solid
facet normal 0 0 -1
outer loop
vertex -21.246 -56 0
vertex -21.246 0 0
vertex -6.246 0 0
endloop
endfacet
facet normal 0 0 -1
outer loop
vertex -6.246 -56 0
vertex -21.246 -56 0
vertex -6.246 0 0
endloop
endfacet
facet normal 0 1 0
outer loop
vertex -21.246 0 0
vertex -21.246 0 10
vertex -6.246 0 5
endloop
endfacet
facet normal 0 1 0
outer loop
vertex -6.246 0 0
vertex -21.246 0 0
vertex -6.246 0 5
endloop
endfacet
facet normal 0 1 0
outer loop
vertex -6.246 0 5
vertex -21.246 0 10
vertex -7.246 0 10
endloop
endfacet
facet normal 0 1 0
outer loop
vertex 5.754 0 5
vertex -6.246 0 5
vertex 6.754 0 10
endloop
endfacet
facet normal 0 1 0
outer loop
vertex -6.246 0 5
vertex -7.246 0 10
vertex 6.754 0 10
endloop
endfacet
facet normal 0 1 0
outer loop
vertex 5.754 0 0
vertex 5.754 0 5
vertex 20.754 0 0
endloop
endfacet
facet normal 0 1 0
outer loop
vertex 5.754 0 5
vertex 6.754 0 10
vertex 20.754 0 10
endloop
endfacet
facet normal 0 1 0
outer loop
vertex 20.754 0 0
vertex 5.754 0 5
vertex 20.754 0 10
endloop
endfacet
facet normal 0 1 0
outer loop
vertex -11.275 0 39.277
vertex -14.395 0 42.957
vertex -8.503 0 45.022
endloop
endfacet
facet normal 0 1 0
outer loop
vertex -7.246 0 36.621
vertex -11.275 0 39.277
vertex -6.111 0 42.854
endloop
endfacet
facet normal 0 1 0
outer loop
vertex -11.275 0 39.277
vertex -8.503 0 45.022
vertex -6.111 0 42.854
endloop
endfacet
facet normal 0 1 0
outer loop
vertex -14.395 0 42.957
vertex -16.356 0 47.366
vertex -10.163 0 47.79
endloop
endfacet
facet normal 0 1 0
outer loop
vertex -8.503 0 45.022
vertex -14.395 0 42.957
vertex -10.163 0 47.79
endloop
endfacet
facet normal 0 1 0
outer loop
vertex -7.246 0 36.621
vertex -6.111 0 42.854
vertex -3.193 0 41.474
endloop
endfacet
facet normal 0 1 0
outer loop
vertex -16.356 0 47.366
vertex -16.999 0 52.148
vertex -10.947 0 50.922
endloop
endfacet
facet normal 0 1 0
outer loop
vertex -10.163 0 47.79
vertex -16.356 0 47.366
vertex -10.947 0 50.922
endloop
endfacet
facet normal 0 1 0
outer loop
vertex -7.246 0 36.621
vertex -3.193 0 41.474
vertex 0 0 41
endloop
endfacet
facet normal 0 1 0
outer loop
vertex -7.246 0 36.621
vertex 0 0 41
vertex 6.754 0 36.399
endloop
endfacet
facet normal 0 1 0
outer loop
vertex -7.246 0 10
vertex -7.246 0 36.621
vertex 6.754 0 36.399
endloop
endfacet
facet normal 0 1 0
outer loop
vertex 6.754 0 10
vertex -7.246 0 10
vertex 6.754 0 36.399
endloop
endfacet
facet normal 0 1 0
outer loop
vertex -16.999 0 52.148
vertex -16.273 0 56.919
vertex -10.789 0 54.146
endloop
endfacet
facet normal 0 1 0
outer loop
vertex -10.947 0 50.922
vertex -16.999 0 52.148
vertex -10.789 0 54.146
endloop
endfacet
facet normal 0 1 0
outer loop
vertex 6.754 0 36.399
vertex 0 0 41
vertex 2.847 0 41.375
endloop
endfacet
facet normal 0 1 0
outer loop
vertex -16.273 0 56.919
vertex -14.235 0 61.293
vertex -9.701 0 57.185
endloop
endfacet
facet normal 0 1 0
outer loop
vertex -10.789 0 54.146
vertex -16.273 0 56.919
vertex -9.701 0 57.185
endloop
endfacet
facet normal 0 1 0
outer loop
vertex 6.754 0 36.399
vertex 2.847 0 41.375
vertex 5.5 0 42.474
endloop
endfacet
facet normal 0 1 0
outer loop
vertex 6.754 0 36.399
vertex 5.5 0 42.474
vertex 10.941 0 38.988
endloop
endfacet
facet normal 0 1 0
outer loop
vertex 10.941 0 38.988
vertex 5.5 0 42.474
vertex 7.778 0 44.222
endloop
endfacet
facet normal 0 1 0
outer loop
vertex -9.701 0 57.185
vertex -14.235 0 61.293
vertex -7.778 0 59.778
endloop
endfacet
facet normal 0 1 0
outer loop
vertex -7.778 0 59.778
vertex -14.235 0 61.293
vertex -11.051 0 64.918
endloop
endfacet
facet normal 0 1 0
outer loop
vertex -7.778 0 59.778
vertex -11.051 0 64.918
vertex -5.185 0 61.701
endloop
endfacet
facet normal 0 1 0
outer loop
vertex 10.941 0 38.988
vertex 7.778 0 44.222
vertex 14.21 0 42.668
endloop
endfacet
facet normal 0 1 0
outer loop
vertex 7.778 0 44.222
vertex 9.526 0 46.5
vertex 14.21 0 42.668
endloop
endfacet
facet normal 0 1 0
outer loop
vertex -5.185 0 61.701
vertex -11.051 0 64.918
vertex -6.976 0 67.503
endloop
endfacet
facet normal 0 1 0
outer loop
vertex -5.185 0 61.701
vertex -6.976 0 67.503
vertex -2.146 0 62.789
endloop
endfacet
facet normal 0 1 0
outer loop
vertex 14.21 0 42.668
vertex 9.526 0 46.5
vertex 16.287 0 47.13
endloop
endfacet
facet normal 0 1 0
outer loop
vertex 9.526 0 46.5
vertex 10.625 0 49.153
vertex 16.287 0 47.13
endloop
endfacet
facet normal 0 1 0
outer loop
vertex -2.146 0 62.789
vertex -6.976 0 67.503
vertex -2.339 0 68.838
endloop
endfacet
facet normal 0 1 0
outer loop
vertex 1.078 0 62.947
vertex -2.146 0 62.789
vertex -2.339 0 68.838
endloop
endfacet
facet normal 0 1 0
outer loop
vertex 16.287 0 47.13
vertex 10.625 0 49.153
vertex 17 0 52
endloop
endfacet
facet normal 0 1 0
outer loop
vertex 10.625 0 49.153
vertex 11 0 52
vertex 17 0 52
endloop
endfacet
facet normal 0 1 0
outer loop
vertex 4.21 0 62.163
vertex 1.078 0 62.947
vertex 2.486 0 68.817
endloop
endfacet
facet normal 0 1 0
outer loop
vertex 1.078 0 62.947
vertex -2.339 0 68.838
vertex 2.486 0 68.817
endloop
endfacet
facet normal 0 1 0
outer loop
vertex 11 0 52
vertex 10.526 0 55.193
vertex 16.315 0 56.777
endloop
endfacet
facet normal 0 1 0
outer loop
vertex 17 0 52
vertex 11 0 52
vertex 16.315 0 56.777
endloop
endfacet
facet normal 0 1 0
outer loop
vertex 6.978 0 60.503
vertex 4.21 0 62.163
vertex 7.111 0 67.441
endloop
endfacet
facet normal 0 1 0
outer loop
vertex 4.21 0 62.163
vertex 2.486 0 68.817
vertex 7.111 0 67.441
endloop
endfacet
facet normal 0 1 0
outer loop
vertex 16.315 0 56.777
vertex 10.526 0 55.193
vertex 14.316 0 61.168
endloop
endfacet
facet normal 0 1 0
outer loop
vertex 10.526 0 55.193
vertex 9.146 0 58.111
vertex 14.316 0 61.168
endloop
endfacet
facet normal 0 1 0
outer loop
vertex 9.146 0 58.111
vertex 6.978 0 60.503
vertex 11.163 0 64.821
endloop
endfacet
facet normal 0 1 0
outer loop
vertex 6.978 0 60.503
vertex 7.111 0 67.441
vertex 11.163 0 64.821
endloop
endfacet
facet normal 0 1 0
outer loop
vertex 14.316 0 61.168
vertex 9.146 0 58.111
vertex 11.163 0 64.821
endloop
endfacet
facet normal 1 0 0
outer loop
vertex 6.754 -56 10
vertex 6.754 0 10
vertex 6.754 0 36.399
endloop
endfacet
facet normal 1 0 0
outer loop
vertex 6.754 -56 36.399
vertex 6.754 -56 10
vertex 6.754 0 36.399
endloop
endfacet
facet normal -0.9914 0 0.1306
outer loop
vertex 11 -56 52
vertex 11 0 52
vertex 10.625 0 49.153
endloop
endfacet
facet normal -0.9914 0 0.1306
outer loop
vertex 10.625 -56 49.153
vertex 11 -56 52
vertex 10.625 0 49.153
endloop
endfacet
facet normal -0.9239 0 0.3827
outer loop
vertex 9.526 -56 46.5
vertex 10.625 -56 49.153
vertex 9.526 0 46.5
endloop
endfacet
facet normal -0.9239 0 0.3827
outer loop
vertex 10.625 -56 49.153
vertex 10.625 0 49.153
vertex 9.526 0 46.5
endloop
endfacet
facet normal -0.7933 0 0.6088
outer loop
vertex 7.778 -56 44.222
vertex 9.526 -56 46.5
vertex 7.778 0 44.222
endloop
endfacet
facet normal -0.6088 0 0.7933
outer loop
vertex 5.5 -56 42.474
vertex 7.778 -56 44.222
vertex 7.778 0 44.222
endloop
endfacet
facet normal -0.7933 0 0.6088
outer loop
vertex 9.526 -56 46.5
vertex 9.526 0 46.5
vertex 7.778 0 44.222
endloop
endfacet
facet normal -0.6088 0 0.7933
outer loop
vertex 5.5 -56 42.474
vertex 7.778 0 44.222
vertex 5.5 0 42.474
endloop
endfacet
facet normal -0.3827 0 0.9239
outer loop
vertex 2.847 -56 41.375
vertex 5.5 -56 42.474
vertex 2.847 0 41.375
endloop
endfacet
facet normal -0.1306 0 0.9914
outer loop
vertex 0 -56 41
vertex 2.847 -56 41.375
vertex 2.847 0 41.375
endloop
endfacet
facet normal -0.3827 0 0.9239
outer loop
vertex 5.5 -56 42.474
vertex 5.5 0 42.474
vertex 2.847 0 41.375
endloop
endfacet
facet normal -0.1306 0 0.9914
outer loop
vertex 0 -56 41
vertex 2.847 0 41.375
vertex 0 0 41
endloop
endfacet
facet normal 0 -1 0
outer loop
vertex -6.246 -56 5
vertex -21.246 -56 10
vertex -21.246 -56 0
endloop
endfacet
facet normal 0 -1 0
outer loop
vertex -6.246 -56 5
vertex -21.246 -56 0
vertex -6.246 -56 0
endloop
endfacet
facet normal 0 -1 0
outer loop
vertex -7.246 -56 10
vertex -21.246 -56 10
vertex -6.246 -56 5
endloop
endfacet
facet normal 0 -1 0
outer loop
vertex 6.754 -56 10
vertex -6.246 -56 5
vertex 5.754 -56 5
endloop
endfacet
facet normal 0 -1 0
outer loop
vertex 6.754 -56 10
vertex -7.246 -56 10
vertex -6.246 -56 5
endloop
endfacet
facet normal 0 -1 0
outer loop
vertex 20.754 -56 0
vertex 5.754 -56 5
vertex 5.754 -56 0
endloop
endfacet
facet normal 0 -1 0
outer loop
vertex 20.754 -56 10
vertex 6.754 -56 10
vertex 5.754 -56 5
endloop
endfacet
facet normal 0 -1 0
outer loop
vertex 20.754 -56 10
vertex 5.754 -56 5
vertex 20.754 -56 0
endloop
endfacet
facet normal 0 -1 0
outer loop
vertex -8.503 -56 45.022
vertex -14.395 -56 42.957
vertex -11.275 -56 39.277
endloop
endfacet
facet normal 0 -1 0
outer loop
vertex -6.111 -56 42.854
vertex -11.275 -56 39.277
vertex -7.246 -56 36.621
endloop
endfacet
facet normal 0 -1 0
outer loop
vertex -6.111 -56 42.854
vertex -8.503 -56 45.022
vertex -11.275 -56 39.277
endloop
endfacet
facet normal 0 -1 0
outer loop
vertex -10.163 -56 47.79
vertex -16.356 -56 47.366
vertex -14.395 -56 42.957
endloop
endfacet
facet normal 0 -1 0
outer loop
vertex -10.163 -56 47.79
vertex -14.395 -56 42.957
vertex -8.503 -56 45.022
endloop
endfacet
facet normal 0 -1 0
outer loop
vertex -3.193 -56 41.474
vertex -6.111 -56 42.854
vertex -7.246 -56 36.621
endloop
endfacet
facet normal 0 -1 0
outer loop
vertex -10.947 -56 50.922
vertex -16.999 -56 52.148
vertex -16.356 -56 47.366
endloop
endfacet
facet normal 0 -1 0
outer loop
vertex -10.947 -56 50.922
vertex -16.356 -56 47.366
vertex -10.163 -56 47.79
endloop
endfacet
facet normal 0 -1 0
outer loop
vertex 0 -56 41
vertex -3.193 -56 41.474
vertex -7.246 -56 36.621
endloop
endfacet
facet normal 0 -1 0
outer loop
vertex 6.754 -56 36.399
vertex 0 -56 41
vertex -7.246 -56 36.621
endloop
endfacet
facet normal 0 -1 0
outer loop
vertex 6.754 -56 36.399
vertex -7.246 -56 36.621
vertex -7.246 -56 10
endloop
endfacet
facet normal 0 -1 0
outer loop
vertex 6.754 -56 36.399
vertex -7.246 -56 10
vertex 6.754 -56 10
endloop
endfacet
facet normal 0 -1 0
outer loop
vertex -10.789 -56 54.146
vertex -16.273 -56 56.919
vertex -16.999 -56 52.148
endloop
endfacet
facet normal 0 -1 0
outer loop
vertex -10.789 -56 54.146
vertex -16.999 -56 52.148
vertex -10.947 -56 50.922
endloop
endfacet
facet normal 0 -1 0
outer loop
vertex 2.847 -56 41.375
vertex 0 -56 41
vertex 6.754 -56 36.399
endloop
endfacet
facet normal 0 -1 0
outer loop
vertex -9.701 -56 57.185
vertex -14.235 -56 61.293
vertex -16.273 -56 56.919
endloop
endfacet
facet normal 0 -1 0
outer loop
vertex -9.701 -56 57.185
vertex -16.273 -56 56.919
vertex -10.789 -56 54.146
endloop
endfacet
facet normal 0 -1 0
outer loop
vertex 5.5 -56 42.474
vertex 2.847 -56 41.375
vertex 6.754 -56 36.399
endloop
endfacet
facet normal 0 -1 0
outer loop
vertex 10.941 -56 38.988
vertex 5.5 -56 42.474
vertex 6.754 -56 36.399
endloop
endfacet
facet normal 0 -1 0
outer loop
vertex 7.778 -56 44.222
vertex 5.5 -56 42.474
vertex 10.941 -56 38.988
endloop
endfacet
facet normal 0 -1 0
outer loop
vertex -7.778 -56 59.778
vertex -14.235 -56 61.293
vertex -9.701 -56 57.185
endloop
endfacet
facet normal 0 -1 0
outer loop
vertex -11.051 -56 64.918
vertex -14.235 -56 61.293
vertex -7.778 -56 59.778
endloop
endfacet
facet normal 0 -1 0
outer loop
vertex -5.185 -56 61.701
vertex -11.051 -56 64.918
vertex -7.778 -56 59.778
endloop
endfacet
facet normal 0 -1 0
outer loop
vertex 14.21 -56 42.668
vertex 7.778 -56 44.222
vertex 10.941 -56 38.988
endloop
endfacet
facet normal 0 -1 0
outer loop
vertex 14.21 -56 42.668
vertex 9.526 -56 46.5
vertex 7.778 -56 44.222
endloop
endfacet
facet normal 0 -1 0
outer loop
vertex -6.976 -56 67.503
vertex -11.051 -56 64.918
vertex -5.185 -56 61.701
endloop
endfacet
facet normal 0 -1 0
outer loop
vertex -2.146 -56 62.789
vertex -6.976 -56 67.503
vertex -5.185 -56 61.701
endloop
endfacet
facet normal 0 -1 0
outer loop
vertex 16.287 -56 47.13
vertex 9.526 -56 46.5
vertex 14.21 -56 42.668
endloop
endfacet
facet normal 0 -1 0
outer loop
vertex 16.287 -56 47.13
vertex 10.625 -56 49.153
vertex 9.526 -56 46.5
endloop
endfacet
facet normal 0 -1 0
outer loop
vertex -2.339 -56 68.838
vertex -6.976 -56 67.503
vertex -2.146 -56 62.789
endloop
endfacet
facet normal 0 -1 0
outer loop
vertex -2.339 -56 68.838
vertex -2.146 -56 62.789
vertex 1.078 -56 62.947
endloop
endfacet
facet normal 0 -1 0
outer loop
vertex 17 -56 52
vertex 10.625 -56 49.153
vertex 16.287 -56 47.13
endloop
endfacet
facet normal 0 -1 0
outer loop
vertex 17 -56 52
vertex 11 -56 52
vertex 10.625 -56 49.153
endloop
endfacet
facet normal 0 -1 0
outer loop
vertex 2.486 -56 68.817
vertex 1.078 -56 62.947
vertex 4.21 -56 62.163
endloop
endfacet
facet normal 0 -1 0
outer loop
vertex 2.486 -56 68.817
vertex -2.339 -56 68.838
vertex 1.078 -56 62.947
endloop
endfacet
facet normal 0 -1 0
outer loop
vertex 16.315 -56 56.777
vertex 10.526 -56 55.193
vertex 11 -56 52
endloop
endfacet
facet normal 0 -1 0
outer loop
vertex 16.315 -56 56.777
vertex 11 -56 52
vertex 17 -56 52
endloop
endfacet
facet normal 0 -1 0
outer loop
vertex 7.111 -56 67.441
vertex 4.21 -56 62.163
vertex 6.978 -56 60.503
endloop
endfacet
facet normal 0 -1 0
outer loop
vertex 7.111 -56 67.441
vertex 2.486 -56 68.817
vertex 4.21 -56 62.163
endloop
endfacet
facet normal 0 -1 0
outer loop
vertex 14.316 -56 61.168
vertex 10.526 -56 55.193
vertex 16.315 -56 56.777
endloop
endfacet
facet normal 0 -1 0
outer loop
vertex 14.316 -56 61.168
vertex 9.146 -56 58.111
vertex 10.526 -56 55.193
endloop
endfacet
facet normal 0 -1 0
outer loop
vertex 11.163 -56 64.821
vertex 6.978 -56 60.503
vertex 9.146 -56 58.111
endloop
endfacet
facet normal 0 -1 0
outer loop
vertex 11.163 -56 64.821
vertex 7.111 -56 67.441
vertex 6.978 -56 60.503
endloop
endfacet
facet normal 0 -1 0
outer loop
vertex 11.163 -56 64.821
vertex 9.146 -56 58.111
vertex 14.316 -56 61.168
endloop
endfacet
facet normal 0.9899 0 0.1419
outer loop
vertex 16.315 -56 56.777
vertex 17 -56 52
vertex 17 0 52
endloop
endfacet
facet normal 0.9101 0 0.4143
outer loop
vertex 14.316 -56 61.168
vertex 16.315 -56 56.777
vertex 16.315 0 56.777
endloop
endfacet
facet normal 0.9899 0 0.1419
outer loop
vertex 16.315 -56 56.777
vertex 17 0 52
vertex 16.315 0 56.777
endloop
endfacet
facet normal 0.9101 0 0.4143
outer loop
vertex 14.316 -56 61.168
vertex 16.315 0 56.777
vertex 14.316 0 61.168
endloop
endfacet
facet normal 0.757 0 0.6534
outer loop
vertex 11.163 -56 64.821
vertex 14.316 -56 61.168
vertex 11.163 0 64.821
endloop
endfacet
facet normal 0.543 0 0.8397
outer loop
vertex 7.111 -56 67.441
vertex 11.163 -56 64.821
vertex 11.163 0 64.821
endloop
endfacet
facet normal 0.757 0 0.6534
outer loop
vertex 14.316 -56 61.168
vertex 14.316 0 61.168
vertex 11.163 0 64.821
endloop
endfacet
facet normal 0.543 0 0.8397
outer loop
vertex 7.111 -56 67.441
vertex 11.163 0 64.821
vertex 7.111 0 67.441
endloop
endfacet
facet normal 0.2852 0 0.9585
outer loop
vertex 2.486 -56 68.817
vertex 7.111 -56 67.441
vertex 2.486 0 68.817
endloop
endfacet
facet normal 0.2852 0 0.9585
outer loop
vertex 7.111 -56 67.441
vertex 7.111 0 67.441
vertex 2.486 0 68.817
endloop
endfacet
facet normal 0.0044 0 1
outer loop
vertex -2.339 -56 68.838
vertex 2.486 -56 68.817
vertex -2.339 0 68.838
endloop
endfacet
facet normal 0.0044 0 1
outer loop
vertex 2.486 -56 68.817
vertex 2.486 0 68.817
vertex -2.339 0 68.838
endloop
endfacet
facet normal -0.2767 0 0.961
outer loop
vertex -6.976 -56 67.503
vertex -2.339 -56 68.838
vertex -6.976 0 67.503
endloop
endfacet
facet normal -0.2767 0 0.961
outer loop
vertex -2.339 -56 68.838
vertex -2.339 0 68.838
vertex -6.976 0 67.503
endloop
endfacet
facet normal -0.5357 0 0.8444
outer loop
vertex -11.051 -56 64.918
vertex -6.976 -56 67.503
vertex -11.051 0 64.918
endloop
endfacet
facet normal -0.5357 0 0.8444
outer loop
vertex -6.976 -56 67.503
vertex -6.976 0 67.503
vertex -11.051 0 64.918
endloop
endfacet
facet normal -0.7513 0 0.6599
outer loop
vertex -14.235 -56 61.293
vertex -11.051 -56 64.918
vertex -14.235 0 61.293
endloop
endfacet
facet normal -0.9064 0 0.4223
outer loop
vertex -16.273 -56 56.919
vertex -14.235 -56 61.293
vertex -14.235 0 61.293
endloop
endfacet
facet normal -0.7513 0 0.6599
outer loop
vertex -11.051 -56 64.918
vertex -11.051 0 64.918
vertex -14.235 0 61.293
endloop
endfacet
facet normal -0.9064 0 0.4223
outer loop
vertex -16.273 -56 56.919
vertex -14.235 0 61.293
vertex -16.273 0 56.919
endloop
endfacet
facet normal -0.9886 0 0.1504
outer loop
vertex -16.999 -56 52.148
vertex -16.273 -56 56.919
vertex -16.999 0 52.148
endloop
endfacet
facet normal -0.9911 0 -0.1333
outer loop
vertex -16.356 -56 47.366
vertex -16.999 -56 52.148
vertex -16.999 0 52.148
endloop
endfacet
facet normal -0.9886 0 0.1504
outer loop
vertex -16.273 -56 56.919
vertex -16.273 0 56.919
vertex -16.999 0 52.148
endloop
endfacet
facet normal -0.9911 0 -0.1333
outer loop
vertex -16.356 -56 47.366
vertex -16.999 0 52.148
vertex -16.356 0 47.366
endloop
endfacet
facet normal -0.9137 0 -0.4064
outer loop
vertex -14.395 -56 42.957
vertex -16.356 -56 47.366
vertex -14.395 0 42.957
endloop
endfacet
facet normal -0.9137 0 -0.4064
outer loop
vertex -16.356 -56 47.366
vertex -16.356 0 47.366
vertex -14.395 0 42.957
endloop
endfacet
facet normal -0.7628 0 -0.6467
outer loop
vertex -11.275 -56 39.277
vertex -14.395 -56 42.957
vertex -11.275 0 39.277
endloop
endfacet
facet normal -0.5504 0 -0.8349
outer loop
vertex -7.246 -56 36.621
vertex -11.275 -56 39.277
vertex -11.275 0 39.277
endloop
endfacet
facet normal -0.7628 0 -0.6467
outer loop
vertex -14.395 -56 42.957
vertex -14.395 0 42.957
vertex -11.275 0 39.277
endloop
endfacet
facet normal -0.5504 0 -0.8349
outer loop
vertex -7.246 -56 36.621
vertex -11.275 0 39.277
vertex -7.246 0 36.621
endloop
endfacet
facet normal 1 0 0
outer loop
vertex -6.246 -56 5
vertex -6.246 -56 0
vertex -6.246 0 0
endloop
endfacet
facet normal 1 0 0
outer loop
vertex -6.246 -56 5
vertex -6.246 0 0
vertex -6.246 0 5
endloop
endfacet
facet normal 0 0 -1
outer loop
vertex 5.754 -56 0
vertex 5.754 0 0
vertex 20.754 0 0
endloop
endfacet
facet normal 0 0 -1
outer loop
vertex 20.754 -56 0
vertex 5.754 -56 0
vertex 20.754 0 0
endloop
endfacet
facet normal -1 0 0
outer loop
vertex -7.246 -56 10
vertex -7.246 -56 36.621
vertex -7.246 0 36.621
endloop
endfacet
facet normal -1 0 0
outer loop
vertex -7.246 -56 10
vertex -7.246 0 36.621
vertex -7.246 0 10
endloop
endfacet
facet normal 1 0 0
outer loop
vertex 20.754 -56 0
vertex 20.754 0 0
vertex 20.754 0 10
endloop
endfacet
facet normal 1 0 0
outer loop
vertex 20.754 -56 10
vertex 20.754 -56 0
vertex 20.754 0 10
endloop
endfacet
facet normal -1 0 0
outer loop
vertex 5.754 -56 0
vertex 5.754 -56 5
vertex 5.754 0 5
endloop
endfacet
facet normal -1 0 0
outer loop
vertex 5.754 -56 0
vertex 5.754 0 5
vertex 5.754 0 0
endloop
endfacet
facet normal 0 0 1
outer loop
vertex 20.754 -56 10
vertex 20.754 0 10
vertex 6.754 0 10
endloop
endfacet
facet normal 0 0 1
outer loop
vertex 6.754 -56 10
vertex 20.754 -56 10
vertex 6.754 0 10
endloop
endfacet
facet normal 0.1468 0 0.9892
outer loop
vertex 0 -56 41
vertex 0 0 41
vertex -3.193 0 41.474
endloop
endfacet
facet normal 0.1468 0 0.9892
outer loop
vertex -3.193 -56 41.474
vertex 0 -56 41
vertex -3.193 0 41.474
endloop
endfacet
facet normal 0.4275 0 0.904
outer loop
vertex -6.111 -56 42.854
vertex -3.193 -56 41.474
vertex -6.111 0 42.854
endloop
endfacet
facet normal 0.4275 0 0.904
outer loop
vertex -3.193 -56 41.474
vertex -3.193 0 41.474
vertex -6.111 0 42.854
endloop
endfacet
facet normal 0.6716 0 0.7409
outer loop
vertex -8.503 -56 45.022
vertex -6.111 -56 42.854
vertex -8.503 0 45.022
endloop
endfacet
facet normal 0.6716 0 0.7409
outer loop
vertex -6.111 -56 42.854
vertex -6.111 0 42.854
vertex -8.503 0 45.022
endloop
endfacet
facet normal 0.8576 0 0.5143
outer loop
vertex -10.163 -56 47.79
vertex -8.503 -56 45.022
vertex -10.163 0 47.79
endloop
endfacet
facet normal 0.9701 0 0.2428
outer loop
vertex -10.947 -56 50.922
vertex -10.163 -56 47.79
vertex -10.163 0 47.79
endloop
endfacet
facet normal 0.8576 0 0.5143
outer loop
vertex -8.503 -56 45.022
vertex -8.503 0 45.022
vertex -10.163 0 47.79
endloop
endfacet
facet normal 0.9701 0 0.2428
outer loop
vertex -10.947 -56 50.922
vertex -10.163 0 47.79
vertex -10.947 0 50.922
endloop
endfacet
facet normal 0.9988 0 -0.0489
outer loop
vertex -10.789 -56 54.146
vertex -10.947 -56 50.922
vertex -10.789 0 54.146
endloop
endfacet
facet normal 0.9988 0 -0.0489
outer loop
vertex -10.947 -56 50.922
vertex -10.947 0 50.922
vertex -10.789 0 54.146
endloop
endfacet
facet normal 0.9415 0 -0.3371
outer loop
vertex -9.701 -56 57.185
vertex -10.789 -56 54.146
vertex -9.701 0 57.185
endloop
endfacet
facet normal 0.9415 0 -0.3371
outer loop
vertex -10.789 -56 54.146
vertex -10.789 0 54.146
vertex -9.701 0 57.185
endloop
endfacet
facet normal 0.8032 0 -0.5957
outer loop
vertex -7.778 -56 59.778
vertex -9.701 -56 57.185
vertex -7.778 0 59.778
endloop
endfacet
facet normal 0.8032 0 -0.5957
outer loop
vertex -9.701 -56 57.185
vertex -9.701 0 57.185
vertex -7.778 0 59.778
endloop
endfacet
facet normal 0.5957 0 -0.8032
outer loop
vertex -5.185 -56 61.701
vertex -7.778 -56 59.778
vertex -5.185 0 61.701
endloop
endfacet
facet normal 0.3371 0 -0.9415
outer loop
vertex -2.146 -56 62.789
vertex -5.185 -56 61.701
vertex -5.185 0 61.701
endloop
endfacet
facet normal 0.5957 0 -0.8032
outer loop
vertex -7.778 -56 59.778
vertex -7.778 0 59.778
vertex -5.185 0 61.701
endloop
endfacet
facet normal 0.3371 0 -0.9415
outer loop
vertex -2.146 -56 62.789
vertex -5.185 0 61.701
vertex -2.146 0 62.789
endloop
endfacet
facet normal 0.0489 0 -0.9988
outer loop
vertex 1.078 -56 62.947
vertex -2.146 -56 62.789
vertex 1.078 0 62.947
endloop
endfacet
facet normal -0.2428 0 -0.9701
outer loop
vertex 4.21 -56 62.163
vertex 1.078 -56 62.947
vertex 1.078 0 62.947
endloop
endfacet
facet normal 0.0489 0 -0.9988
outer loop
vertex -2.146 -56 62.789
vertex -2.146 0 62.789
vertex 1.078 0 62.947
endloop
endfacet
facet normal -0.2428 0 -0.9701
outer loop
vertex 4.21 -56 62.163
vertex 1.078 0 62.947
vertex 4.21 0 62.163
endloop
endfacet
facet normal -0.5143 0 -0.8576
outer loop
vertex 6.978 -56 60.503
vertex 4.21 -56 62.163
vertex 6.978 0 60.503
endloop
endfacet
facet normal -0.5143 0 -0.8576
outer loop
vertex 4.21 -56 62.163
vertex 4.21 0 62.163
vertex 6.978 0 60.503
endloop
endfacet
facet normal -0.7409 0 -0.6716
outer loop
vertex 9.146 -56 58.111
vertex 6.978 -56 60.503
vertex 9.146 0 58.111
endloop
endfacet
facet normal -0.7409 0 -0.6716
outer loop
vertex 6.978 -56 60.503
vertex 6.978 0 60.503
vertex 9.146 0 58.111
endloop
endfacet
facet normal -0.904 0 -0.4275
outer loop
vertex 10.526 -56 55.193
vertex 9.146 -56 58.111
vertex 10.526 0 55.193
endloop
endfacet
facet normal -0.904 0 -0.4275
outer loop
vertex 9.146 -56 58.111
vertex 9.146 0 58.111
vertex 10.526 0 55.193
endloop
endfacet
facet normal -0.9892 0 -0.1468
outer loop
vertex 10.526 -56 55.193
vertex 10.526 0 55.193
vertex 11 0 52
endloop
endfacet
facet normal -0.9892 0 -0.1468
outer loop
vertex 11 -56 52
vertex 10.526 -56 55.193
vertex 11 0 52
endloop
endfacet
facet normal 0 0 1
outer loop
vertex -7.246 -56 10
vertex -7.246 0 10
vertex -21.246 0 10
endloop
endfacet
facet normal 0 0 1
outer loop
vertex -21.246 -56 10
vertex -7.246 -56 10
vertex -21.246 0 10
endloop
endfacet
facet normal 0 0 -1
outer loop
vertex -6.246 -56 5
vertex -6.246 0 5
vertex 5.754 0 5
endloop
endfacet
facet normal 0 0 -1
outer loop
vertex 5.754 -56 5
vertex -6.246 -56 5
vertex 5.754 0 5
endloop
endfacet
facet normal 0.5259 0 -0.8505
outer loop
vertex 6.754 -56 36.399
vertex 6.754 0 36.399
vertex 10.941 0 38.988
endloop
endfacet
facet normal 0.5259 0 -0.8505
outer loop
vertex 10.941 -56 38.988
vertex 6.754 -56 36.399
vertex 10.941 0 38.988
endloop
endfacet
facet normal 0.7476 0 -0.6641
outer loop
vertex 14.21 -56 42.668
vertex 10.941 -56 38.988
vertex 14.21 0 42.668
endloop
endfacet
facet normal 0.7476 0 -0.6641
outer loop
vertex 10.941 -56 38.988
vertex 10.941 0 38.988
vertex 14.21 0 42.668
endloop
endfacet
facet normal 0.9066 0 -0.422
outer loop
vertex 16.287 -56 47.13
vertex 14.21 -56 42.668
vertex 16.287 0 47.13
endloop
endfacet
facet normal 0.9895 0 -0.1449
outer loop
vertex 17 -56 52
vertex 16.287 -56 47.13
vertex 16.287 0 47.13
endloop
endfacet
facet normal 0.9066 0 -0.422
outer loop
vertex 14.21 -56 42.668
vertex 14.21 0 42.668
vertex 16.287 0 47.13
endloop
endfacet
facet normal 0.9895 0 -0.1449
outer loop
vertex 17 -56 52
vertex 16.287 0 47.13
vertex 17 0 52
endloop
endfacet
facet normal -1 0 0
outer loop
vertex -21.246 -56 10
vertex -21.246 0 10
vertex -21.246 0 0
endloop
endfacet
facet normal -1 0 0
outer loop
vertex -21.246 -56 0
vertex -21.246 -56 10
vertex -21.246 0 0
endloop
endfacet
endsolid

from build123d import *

# Parameters (mm, degrees)
F1_DEPTH = 56


with BuildPart() as f1:
    # F0 (on Front) → F1 (new body)
    with BuildSketch(Plane.XZ):
        with BuildLine():
            Line((0, 35), (0, 5))
            Line((0, 5), (5.754496, 5))
            Line((5.754496, 5), (5.754496, 0))
            Line((5.754496, 0), (20.754496, 0))
            Line((20.754496, 0), (20.754496, 10))
            Line((20.754496, 10), (6.754496, 10))
            Line((6.754496, 10), (6.754496, 36.399462))
            ThreePointArc((6.754496, 36.399462), (3.448975, 35.353542), (0, 35))
        make_face()
        with BuildLine():
            Line((-21.245504, 0), (-6.245504, 0))
            Line((-6.245504, 0), (-6.245504, 5))
            Line((-6.245504, 5), (0, 5))
            Line((0, 5), (0, 35))
            ThreePointArc((0, 35), (-3.712349, 35.41029), (-7.245504, 36.621357))
            Line((-7.245504, 36.621357), (-7.245504, 10))
            Line((-7.245504, 10), (-21.245504, 10))
            Line((-21.245504, 10), (-21.245504, 0))
        make_face()
        with BuildLine():
            ThreePointArc((-7.245504, 36.621357), (-3.712349, 35.41029), (0, 35))
            ThreePointArc((0, 35), (3.448975, 35.353542), (6.754496, 36.399462))
            ThreePointArc((6.754496, 36.399462), (14.209617, 42.66797), (17, 52))
            ThreePointArc((17, 52), (-9.105669, 66.355723), (-7.245504, 36.621357))
        make_face()
        with BuildLine():
            ThreePointArc((11, 52), (7.778175, 44.221825), (0, 41))
            ThreePointArc((0, 41), (-7.778175, 59.778175), (11, 52))
        make_face(mode=Mode.SUBTRACT)
    extrude(amount=F1_DEPTH)


solid = f1.part
